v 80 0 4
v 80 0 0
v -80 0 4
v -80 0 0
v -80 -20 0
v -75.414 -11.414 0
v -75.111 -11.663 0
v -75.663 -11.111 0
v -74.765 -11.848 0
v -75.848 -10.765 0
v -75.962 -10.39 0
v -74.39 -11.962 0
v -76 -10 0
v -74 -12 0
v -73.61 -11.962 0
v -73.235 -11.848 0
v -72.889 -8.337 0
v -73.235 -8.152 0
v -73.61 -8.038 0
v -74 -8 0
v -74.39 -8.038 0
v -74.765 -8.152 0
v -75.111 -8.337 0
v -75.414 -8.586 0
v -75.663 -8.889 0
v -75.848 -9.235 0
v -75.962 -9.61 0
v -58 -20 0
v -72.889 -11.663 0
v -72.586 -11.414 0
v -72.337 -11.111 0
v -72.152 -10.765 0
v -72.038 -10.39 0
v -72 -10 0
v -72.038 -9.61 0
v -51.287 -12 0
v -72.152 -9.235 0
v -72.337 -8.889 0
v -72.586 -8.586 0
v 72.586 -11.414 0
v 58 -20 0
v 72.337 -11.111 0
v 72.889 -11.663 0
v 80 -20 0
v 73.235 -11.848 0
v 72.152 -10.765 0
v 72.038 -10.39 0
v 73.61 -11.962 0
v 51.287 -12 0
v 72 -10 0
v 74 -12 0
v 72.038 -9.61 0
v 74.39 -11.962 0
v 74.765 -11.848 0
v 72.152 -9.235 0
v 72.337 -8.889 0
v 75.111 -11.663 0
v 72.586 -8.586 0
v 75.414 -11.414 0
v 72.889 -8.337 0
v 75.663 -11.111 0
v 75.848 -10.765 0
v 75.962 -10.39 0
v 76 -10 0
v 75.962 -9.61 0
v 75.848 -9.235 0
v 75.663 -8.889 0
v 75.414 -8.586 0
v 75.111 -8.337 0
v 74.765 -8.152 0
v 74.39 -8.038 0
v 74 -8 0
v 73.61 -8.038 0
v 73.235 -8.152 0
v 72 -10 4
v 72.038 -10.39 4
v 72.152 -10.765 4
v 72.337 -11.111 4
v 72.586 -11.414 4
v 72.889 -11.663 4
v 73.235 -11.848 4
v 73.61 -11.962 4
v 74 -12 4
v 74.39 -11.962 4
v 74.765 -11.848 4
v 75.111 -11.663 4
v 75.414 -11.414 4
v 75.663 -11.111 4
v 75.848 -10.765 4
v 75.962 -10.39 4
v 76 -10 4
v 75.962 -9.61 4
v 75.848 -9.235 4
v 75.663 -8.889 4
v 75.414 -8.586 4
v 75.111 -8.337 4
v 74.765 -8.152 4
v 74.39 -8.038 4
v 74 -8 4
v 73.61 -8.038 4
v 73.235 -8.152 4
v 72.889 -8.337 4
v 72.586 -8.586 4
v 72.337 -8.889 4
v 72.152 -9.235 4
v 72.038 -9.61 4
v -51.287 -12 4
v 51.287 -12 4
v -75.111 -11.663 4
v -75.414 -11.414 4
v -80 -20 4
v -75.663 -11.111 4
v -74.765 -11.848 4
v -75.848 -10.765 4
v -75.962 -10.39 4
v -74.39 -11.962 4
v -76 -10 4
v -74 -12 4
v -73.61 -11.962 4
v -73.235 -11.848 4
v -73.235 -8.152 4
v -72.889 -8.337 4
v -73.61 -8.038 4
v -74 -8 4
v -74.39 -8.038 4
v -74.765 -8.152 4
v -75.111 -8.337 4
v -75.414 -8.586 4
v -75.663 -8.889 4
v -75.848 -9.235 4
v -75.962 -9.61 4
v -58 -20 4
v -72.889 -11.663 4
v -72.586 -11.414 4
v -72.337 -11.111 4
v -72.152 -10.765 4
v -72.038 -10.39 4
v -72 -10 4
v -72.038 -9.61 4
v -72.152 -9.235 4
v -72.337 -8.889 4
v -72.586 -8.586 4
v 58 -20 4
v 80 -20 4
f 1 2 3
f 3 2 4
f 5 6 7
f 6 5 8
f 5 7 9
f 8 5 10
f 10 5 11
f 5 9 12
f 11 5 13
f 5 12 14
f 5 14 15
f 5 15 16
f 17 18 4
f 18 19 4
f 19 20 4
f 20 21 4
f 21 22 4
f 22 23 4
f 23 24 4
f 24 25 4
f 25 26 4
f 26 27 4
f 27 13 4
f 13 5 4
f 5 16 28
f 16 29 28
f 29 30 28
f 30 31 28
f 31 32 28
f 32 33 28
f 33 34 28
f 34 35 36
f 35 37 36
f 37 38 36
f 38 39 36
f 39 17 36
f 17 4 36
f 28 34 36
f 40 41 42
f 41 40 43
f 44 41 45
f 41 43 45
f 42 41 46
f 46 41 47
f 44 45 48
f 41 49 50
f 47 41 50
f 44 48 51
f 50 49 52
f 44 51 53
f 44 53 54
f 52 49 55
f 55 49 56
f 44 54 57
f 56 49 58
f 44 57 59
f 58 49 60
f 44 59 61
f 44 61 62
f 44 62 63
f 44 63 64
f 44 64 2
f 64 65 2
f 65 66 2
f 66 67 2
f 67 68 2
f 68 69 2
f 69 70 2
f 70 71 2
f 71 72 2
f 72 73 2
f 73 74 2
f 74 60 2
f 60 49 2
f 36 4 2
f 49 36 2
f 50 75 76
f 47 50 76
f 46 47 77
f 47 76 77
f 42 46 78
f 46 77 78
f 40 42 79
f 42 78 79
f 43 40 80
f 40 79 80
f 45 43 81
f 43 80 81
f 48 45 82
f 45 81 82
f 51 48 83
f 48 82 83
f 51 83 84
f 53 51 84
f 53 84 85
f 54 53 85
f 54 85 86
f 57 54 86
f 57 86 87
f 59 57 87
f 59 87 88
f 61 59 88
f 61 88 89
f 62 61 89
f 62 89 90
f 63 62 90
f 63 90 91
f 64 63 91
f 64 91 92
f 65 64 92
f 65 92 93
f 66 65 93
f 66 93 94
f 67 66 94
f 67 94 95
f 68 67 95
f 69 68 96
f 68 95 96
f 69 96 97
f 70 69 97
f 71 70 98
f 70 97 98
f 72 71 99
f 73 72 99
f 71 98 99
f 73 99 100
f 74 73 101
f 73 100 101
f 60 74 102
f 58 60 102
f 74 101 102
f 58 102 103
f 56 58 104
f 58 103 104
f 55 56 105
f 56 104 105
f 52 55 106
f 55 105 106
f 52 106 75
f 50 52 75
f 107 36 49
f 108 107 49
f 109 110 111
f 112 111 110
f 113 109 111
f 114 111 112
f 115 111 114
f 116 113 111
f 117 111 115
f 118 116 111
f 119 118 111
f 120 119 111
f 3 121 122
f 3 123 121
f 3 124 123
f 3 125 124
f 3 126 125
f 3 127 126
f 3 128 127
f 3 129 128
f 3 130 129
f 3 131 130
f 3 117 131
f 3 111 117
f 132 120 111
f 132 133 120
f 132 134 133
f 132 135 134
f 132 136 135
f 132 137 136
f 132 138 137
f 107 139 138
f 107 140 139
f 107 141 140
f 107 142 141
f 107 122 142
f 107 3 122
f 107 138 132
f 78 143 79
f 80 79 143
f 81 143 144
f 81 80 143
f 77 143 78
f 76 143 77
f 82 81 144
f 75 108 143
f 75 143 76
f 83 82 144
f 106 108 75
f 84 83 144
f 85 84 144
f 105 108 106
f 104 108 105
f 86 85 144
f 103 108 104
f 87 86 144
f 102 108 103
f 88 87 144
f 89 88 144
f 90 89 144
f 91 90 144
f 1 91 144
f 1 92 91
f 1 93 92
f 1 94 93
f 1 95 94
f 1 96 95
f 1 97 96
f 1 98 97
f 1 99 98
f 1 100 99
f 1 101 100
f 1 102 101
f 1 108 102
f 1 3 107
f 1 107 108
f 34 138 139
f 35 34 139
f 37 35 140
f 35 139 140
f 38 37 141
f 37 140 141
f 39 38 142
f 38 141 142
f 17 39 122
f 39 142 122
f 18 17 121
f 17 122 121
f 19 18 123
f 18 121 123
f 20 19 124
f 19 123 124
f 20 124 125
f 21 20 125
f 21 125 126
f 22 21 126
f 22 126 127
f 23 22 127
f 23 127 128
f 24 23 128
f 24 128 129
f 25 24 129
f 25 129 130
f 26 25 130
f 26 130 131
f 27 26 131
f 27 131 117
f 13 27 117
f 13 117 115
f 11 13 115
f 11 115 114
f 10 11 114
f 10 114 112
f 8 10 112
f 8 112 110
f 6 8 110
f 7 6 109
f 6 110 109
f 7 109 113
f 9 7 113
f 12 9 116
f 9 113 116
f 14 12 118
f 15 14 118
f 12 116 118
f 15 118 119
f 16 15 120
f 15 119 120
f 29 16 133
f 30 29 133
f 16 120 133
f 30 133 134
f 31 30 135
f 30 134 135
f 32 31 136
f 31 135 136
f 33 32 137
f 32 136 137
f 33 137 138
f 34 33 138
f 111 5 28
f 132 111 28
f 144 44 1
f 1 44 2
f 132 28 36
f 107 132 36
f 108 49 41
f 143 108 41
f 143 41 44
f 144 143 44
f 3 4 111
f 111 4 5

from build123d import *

# Parameters (mm, degrees)
GRUNDPLATTE_DEPTH               = 4
SKIZZE2_R                       = 2
SCHNITT_LINEAR_AUSTRAGEN1_DEPTH = 83.559069762


with BuildPart() as part:
    # Skizze1 → Grundplatte (new body)
    with BuildSketch(Plane.XY):
        Polygon((80, 0), (-80, 0), (-80, -20), (-58, -20), (-51.287202951, -12), (51.287202951, -12), (58, -20), (80, -20), align=None)
    extrude(amount=GRUNDPLATTE_DEPTH)

    # Skizze2 → Schnitt-Linear austragen1 (cut, through all)
    with BuildSketch(Plane.XY.offset(4)):
        with Locations((-74, -10)):
            Circle(SKIZZE2_R)
        with Locations(Location((74, -10, 0), (0, 0, 180))):
            Circle(SKIZZE2_R)
    extrude(amount=-SCHNITT_LINEAR_AUSTRAGEN1_DEPTH, mode=Mode.SUBTRACT)


solid = part.part
